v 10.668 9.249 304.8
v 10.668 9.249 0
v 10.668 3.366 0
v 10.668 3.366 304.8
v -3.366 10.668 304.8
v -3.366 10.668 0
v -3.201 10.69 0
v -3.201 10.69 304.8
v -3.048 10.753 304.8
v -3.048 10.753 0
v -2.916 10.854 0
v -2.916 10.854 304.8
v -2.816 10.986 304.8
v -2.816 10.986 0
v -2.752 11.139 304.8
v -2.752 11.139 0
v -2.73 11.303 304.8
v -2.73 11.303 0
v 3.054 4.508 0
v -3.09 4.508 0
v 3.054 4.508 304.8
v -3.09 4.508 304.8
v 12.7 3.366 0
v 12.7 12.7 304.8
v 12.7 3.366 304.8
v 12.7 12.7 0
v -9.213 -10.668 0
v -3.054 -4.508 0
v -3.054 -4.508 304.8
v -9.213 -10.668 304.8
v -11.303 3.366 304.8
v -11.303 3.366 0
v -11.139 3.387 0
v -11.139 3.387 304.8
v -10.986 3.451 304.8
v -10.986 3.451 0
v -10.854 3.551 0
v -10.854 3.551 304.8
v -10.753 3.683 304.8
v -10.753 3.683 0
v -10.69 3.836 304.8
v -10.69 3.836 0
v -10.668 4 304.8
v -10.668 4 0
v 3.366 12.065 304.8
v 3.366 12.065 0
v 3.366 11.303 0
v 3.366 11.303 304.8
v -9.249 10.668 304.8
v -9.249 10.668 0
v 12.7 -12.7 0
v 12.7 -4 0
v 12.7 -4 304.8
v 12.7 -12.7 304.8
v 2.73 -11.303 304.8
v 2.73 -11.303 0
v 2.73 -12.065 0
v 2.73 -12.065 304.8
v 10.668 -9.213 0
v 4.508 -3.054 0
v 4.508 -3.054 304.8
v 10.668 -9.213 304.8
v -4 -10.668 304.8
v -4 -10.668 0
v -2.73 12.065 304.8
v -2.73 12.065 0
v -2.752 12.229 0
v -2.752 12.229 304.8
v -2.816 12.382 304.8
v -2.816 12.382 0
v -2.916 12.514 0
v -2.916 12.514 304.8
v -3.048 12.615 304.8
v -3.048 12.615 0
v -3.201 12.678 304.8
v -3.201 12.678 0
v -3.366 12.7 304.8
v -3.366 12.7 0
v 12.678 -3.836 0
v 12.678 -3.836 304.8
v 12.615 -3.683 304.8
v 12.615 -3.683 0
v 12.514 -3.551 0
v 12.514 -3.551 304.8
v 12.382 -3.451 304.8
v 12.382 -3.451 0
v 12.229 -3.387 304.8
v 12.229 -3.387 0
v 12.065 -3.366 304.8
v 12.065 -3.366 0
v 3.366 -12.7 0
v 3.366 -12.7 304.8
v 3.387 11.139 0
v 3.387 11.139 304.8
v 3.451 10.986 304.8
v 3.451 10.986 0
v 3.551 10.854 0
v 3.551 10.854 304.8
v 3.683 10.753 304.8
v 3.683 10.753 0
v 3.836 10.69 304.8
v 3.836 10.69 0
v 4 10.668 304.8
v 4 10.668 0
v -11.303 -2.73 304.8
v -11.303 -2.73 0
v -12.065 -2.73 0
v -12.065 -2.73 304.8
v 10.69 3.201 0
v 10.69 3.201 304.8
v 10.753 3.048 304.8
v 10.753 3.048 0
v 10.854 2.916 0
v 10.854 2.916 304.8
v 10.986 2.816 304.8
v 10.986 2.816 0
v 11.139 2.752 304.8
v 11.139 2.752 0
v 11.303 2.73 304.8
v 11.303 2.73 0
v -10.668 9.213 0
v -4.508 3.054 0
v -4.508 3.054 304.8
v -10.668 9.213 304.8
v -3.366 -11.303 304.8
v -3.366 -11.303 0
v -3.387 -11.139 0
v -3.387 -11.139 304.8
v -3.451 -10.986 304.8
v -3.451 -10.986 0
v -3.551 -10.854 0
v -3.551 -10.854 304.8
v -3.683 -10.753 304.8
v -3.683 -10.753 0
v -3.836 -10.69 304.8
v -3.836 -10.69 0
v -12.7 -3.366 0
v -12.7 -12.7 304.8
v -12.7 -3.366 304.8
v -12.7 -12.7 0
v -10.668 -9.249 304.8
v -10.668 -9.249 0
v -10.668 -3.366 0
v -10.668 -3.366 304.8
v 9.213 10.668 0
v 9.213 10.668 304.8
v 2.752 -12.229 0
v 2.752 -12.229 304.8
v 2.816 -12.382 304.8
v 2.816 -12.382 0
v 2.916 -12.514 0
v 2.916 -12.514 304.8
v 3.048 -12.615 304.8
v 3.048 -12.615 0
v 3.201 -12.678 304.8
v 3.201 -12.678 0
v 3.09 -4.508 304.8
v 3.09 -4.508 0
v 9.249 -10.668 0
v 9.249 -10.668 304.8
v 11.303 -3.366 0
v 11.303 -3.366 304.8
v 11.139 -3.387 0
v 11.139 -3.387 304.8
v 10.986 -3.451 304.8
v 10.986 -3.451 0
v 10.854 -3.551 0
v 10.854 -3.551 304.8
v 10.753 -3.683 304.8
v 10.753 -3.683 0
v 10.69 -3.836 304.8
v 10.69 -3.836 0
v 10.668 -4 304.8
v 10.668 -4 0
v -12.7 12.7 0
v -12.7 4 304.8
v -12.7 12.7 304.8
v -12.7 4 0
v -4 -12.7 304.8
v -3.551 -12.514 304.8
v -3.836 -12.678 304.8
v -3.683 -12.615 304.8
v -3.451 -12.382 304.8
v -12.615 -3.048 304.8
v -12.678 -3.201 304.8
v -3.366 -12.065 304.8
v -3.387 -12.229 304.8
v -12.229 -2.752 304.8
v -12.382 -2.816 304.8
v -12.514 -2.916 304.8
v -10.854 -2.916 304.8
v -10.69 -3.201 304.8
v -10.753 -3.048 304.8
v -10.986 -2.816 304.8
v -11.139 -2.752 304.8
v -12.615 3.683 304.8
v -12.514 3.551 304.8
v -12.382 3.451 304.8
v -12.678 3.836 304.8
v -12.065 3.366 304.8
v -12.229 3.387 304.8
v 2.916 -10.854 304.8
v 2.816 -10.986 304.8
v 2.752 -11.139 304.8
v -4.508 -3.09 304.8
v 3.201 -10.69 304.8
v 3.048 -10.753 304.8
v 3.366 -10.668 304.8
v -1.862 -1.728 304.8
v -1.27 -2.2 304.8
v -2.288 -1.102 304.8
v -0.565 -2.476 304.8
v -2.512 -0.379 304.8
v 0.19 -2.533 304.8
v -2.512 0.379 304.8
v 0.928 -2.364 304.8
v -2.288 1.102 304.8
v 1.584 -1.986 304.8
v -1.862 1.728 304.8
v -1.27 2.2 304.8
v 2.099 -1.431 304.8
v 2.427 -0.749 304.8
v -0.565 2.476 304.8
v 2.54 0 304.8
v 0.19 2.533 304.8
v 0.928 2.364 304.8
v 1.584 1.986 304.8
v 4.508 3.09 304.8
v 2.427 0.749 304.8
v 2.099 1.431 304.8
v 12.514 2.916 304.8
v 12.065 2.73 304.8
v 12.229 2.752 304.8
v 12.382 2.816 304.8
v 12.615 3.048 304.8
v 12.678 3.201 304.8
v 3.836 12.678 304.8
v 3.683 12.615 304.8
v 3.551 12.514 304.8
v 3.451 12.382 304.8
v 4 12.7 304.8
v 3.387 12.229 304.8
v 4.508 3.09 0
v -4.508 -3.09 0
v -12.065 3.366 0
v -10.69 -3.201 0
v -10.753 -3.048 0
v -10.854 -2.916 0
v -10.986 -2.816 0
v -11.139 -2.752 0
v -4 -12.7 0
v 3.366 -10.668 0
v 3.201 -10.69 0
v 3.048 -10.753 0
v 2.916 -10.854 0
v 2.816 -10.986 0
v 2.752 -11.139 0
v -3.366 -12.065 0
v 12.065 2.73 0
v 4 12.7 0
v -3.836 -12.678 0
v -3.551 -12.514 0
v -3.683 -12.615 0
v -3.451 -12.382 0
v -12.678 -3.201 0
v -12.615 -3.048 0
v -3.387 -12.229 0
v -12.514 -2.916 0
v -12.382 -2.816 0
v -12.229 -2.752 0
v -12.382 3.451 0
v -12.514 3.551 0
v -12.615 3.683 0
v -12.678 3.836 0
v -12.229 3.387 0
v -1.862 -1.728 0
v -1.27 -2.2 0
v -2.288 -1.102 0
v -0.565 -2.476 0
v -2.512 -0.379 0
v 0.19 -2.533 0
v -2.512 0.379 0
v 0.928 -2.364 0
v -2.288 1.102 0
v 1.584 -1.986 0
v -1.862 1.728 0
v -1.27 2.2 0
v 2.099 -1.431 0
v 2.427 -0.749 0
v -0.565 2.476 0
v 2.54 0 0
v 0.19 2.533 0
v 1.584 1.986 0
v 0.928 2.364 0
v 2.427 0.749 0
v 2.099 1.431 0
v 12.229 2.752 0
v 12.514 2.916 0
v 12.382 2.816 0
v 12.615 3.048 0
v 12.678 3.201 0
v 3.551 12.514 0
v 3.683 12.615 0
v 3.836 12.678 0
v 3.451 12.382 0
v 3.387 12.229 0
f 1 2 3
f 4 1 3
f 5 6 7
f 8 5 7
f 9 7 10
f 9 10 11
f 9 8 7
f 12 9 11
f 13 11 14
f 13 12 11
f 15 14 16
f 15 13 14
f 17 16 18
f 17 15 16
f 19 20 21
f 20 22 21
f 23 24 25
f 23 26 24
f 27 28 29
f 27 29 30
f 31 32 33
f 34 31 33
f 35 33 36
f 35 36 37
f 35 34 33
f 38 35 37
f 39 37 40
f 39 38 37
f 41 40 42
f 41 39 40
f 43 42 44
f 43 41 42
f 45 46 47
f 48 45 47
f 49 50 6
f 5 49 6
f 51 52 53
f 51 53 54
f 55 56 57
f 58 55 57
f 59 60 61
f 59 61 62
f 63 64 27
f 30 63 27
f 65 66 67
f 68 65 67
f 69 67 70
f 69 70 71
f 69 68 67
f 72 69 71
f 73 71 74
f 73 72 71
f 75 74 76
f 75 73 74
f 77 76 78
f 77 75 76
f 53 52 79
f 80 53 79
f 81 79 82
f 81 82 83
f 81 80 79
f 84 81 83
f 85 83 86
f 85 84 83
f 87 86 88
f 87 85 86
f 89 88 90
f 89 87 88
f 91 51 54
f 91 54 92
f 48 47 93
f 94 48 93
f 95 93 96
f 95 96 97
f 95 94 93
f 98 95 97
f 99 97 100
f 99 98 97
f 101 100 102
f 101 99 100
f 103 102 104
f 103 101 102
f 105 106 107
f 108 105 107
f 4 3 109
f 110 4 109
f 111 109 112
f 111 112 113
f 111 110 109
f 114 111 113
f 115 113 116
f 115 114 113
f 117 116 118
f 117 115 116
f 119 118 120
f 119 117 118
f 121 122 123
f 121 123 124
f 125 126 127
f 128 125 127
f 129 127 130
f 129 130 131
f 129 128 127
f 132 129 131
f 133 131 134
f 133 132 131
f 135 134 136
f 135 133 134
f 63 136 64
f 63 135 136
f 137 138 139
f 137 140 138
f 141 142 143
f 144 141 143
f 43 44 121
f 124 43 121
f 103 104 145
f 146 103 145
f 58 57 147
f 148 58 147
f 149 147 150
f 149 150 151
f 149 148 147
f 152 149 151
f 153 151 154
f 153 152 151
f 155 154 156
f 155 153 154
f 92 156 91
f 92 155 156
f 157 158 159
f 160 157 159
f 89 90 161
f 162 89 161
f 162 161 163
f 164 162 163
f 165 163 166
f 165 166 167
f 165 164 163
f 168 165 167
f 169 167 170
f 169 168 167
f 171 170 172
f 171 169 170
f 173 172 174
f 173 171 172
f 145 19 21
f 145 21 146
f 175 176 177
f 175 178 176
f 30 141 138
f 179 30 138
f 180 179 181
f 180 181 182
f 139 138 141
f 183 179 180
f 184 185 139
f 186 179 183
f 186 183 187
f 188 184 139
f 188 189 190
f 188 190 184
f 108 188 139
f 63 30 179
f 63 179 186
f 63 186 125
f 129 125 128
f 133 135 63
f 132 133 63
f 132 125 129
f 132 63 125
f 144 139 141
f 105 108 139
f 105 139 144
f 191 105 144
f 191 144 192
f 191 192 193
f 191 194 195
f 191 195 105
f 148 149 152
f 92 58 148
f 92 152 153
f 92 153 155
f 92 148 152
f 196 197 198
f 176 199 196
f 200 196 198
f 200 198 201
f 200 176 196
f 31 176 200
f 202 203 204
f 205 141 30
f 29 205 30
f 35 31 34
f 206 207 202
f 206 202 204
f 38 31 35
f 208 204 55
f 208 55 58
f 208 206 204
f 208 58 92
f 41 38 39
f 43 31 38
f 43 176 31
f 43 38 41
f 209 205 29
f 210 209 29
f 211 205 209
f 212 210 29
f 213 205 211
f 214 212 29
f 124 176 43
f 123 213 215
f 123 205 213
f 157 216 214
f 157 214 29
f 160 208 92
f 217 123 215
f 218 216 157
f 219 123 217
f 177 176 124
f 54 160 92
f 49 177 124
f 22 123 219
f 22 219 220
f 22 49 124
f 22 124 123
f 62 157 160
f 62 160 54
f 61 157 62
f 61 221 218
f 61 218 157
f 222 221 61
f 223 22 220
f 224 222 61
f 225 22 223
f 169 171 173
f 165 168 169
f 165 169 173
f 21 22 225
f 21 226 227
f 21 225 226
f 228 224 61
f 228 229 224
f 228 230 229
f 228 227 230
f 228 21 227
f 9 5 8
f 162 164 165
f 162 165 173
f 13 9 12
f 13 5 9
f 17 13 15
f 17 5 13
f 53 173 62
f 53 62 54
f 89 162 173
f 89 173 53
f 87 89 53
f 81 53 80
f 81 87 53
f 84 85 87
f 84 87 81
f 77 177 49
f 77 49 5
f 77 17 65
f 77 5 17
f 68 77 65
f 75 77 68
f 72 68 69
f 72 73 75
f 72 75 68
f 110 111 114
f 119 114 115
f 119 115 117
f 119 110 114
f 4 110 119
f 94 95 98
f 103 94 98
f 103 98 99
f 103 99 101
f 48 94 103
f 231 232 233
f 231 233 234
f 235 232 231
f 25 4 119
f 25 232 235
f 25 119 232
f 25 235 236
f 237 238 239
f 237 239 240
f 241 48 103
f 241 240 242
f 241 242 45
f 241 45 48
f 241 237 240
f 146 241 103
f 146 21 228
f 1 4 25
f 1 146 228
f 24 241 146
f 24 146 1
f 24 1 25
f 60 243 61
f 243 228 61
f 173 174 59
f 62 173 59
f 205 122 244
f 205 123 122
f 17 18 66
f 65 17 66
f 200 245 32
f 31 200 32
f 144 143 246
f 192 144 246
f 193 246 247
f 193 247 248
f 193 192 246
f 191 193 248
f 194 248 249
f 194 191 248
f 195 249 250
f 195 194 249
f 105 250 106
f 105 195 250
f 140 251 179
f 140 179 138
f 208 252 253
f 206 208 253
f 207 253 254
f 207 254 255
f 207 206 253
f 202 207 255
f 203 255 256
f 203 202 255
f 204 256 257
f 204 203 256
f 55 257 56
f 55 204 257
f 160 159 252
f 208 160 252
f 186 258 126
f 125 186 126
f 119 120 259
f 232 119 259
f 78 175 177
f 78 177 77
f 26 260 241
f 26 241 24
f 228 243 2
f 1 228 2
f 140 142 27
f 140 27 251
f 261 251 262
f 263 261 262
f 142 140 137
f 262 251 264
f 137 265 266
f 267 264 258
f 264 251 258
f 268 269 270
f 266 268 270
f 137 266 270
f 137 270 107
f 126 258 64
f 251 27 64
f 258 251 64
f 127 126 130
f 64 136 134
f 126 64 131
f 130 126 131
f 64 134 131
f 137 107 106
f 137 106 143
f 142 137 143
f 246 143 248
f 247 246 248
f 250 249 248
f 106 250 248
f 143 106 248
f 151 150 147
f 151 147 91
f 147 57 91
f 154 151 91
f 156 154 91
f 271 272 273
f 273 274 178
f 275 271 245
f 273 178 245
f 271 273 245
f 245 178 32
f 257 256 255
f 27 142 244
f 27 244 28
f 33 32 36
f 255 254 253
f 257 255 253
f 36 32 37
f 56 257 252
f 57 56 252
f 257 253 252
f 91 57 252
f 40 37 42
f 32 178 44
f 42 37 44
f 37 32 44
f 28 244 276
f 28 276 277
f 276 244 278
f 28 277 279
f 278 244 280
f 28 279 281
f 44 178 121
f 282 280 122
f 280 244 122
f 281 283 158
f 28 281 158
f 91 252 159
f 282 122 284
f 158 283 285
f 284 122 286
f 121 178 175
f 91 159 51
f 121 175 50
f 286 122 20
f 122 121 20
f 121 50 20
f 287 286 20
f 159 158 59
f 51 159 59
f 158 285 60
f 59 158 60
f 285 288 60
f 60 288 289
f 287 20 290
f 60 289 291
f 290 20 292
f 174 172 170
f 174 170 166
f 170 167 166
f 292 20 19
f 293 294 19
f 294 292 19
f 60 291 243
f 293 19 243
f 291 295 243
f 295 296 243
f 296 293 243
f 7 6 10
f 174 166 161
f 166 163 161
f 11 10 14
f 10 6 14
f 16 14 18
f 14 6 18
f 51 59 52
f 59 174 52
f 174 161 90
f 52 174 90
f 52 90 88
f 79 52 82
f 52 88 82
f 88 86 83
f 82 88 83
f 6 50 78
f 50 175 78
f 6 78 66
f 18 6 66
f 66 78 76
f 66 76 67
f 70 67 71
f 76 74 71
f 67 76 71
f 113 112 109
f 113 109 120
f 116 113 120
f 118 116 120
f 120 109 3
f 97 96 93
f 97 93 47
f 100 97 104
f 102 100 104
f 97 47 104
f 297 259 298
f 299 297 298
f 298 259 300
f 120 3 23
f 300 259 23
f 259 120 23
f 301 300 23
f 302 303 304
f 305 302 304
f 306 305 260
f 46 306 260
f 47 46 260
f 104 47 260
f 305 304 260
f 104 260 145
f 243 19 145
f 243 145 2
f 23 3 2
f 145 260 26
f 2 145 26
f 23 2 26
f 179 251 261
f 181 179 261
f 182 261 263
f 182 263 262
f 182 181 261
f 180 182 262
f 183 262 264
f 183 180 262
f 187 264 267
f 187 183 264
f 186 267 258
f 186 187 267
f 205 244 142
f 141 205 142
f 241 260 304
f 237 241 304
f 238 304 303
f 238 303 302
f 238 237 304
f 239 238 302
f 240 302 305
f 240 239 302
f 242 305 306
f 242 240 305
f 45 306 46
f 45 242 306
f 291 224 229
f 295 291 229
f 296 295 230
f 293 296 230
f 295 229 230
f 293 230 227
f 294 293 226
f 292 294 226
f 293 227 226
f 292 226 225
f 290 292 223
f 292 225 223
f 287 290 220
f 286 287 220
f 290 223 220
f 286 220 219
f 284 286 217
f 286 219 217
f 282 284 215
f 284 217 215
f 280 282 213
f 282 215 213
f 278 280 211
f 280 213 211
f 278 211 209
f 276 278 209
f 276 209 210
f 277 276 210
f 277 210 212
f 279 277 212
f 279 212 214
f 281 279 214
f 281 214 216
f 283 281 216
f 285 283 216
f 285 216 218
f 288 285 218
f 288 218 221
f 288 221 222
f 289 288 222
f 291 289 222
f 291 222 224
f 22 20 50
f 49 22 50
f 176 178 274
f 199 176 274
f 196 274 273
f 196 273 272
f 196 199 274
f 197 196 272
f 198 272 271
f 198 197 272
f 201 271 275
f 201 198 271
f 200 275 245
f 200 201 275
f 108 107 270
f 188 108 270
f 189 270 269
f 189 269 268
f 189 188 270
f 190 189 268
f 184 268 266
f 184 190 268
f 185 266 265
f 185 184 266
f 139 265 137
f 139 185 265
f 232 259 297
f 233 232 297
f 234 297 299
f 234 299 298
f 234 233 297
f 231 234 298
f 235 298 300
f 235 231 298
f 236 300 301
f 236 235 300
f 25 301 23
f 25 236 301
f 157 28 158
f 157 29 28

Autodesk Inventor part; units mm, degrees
ref_plane "YZ Plane" through (0, 0, 0) normal (1, 0, 0) x (0, 1, 0)
ref_plane "XZ Plane" through (0, 0, 0) normal (0, 1, 0) x (-1, 0, 0)
ref_plane "XY Plane" through (0, 0, 0) normal (0, 0, 1) x (1, 0, 0)
sketch "Sketch1" plane through (0, 0, 0) normal (0, 0, 1) x (1, 0, 0)
  line L0 (-12.7, 12.7) -> (12.7, 12.7)
  line L1 (12.7, 12.7) -> (12.7, -12.7)
  line L2 (12.7, -12.7) -> (-12.7, -12.7)
  line L3 (-12.7, -12.7) -> (-12.7, 12.7)
  point P0 (0, 0)
  dimension "d0" = 25.4
  dimension "d1" = 25.4
  dimension "d2" = 12.7
  dimension "d3" = 12.7
extrude "Extrusion1" add sketch "Sketch1" along normal blind 304.8
sketch "Sketch2" plane through (0, 0, 304.8) normal (0, 0, 1) x (1, 0, 0)
  circle A0 centre (0, 0) radius 2.54
  line L0 (-4.5085, 4.5085) -> (4.5085, 4.5085)
  line L1 (-4.5085, -4.5085) -> (4.5085, -4.5085)
  line L2 (4.5085, 4.5085) -> (4.5085, -4.5085)
  line L3 (-4.5085, 4.5085) -> (-4.5085, -4.5085)
  line L4 (-3.0896, 4.5085) -> (-11.2811, 12.7)
  line L5 (-4.5085, 3.0537) -> (-12.7, 11.2452)
  line L6 (12.7, 12.7) -> (-12.7, 12.7) projected
  line L7 (-12.7, 12.7) -> (-12.7, 4.0005)
  line L8 (-10.668, 4.0005) -> (-10.668, 9.2132)
  line L9 (-9.2491, 10.668) -> (-3.3655, 10.668)
  line L10 (-12.7, 12.7) -> (-3.3655, 12.7)
  line L11 (-2.7305, 11.303) -> (-2.7305, 12.065)
  line L12 (-12.065, 3.3655) -> (-11.303, 3.3655)
  arc A1 (-12.7, 4.0005) -> (-12.065, 3.3655) centre (-12.065, 4.0005) ccw
  arc A2 (-11.303, 3.3655) -> (-10.668, 4.0005) centre (-11.303, 4.0005) ccw
  arc A3 (-3.3655, 10.668) -> (-2.7305, 11.303) centre (-3.3655, 11.303) ccw
  arc A4 (-2.7305, 12.065) -> (-3.3655, 12.7) centre (-3.3655, 12.065) ccw
  arc A5 (-3.3655, -11.303) -> (-4.0005, -10.668) centre (-4.0005, -11.303) ccw
  line L13 (-3.3655, -12.065) -> (-3.3655, -11.303)
  arc A6 (-4.0005, -12.7) -> (-3.3655, -12.065) centre (-4.0005, -12.065) ccw
  line L14 (-3.0537, -4.5085) -> (-11.2452, -12.7)
  line L15 (-10.668, -9.2491) -> (-10.668, -3.3655)
  line L16 (-4.5085, -3.0896) -> (-12.7, -11.2811)
  line L17 (-12.7, -12.7) -> (-12.7, -3.3655)
  arc A7 (-10.668, -3.3655) -> (-11.303, -2.7305) centre (-11.303, -3.3655) ccw
  line L18 (-11.303, -2.7305) -> (-12.065, -2.7305)
  arc A8 (-12.065, -2.7305) -> (-12.7, -3.3655) centre (-12.065, -3.3655) ccw
  line L19 (-4.0005, -10.668) -> (-9.2132, -10.668)
  line L20 (-12.7, -12.7) -> (-4.0005, -12.7)
  arc A9 (11.303, -3.3655) -> (10.668, -4.0005) centre (11.303, -4.0005) ccw
  line L21 (12.065, -3.3655) -> (11.303, -3.3655)
  arc A10 (12.7, -4.0005) -> (12.065, -3.3655) centre (12.065, -4.0005) ccw
  line L22 (4.5085, -3.0537) -> (12.7, -11.2452)
  line L23 (9.2491, -10.668) -> (3.3655, -10.668)
  line L24 (3.0896, -4.5085) -> (11.2811, -12.7)
  line L25 (12.7, -12.7) -> (3.3655, -12.7)
  arc A11 (3.3655, -10.668) -> (2.7305, -11.303) centre (3.3655, -11.303) ccw
  line L26 (2.7305, -11.303) -> (2.7305, -12.065)
  arc A12 (2.7305, -12.065) -> (3.3655, -12.7) centre (3.3655, -12.065) ccw
  line L27 (10.668, -4.0005) -> (10.668, -9.2132)
  line L28 (12.7, -12.7) -> (12.7, -4.0005)
  arc A13 (3.3655, 11.303) -> (4.0005, 10.668) centre (4.0005, 11.303) ccw
  line L29 (3.3655, 12.065) -> (3.3655, 11.303)
  arc A14 (4.0005, 12.7) -> (3.3655, 12.065) centre (4.0005, 12.065) ccw
  line L30 (3.0537, 4.5085) -> (11.2452, 12.7)
  line L31 (10.668, 9.2491) -> (10.668, 3.3655)
  line L32 (4.5085, 3.0896) -> (12.7, 11.2811)
  line L33 (12.7, 12.7) -> (12.7, 3.3655)
  arc A15 (10.668, 3.3655) -> (11.303, 2.7305) centre (11.303, 3.3655) ccw
  line L34 (11.303, 2.7305) -> (12.065, 2.7305)
  arc A16 (12.065, 2.7305) -> (12.7, 3.3655) centre (12.065, 3.3655) ccw
  line L35 (4.0005, 10.668) -> (9.2132, 10.668)
  line L36 (12.7, 12.7) -> (4.0005, 12.7)
  line L37 (-4.5085, 3.0537) -> (-4.5085, 4.5085)
  line L38 (-3.0896, 4.5085) -> (-4.5085, 4.5085)
  line L39 (-12.7, -12.7) -> (-4.0005, -12.7)
  line L40 (-4.0005, -10.668) -> (-9.2132, -10.668)
  line L41 (-10.668, -9.2491) -> (-10.668, -3.3655)
  line L42 (-12.7, -12.7) -> (-12.7, -3.3655)
  line L43 (-11.303, -2.7305) -> (-12.065, -2.7305)
  arc A17 (-10.668, -3.3655) -> (-11.303, -2.7305) centre (-11.303, -3.3655) ccw
  arc A18 (-12.065, -2.7305) -> (-12.7, -3.3655) centre (-12.065, -3.3655) ccw
  line L44 (-4.5085, -3.0896) -> (-4.5085, -4.5085)
  line L45 (-4.5085, -3.0896) -> (-12.7, -11.2811)
  line L46 (-3.0537, -4.5085) -> (-4.5085, -4.5085)
  line L47 (-3.0537, -4.5085) -> (-11.2452, -12.7)
  line L48 (-4.5085, -4.5085) -> (-4.5085, 4.5085)
  circle A19 centre (0, 0) radius 2.54
  line L49 (-4.5085, -4.5085) -> (4.5085, -4.5085)
  line L50 (-3.3655, -12.065) -> (-3.3655, -11.303)
  arc A20 (-4.0005, -12.7) -> (-3.3655, -12.065) centre (-4.0005, -12.065) ccw
  arc A21 (-3.3655, -11.303) -> (-4.0005, -10.668) centre (-4.0005, -11.303) ccw
  line L51 (12.7, -12.7) -> (12.7, -4.0005)
  line L52 (10.668, -4.0005) -> (10.668, -9.2132)
  line L53 (9.2491, -10.668) -> (3.3655, -10.668)
  line L54 (12.7, -12.7) -> (3.3655, -12.7)
  line L55 (2.7305, -11.303) -> (2.7305, -12.065)
  arc A22 (3.3655, -10.668) -> (2.7305, -11.303) centre (3.3655, -11.303) ccw
  arc A23 (2.7305, -12.065) -> (3.3655, -12.7) centre (3.3655, -12.065) ccw
  line L56 (3.0896, -4.5085) -> (4.5085, -4.5085)
  line L57 (3.0896, -4.5085) -> (11.2811, -12.7)
  line L58 (4.5085, -3.0537) -> (4.5085, -4.5085)
  line L59 (4.5085, -3.0537) -> (12.7, -11.2452)
  line L60 (4.5085, -4.5085) -> (-4.5085, -4.5085)
  circle A24 centre (0, 0) radius 2.54
  line L61 (4.5085, -4.5085) -> (4.5085, 4.5085)
  line L62 (12.065, -3.3655) -> (11.303, -3.3655)
  arc A25 (12.7, -4.0005) -> (12.065, -3.3655) centre (12.065, -4.0005) ccw
  arc A26 (11.303, -3.3655) -> (10.668, -4.0005) centre (11.303, -4.0005) ccw
  line L63 (12.7, 12.7) -> (4.0005, 12.7)
  line L64 (4.0005, 10.668) -> (9.2132, 10.668)
  line L65 (10.668, 9.2491) -> (10.668, 3.3655)
  line L66 (12.7, 12.7) -> (12.7, 3.3655)
  line L67 (11.303, 2.7305) -> (12.065, 2.7305)
  arc A27 (10.668, 3.3655) -> (11.303, 2.7305) centre (11.303, 3.3655) ccw
  arc A28 (12.065, 2.7305) -> (12.7, 3.3655) centre (12.065, 3.3655) ccw
  line L68 (4.5085, 3.0896) -> (4.5085, 4.5085)
  line L69 (4.5085, 3.0896) -> (12.7, 11.2811)
  line L70 (3.0537, 4.5085) -> (4.5085, 4.5085)
  line L71 (3.0537, 4.5085) -> (11.2452, 12.7)
  line L72 (4.5085, 4.5085) -> (4.5085, -4.5085)
  circle A29 centre (0, 0) radius 2.54
  line L73 (4.5085, 4.5085) -> (-4.5085, 4.5085)
  line L74 (3.3655, 12.065) -> (3.3655, 11.303)
  arc A30 (4.0005, 12.7) -> (3.3655, 12.065) centre (4.0005, 12.065) ccw
  arc A31 (3.3655, 11.303) -> (4.0005, 10.668) centre (4.0005, 11.303) ccw
  point P0 (-12.7, 3.3655)
  point P1 (-2.7305, 12.7)
  point P2 (-3.3655, -12.7)
  point P3 (-12.7, -2.7305)
  point P4 (12.7, -3.3655)
  point P5 (2.7305, -12.7)
  point P6 (3.3655, 12.7)
  point P7 (12.7, 2.7305)
  point P8 (-3.3655, -12.7)
  point P9 (-12.7, -2.7305)
  point P10 (12.7, -3.3655)
  point P11 (2.7305, -12.7)
  point P12 (3.3655, 12.7)
  point P13 (12.7, 2.7305)
  dimension "d6" = 5.08
  dimension "d7" = 9.017
  dimension "d8" = 4.5085
  dimension "d9" = 4.5085
  dimension "d10" = 4.5085
  dimension "d11" = 2.032
  dimension "d12" = 1.0033
  dimension "d13" = 135
  dimension "d17" = 9.3345
  dimension "d19" = 2.032
  dimension "d20" = 2.032
  dimension "d21" = 0.635
  dimension "d22" = 9.3345
  dimension "d25" = 360
  dimension "d29" = 360
extrude "Extrusion2" cut sketch "Sketch2" against normal blind 1219.2 contours L3 L5 L7 L6 L4 L0 | L0 L2 L1 L3 | L30 L6 L33 L32 L2 L0 | L4 L6 A4 L11 A3 L9 | L3 L1 L14 L20 L17 L16 | L8 A2 L12 A1 L7 L5 | L35 A13 L29 A14 L6 L30 | L16 L17 A8 L18 A7 L15 | L22 L28 L25 L24 L1 L2 | L32 L33 A16 L34 A15 L31 | L19 A5 L13 A6 L20 L14 | L27 A9 L21 A10 L28 L22 | L24 L25 A12 L26 A11 L23 keep common part
equation "\"d22\" = d17"
properties part number "Handle Holding PIECE"
